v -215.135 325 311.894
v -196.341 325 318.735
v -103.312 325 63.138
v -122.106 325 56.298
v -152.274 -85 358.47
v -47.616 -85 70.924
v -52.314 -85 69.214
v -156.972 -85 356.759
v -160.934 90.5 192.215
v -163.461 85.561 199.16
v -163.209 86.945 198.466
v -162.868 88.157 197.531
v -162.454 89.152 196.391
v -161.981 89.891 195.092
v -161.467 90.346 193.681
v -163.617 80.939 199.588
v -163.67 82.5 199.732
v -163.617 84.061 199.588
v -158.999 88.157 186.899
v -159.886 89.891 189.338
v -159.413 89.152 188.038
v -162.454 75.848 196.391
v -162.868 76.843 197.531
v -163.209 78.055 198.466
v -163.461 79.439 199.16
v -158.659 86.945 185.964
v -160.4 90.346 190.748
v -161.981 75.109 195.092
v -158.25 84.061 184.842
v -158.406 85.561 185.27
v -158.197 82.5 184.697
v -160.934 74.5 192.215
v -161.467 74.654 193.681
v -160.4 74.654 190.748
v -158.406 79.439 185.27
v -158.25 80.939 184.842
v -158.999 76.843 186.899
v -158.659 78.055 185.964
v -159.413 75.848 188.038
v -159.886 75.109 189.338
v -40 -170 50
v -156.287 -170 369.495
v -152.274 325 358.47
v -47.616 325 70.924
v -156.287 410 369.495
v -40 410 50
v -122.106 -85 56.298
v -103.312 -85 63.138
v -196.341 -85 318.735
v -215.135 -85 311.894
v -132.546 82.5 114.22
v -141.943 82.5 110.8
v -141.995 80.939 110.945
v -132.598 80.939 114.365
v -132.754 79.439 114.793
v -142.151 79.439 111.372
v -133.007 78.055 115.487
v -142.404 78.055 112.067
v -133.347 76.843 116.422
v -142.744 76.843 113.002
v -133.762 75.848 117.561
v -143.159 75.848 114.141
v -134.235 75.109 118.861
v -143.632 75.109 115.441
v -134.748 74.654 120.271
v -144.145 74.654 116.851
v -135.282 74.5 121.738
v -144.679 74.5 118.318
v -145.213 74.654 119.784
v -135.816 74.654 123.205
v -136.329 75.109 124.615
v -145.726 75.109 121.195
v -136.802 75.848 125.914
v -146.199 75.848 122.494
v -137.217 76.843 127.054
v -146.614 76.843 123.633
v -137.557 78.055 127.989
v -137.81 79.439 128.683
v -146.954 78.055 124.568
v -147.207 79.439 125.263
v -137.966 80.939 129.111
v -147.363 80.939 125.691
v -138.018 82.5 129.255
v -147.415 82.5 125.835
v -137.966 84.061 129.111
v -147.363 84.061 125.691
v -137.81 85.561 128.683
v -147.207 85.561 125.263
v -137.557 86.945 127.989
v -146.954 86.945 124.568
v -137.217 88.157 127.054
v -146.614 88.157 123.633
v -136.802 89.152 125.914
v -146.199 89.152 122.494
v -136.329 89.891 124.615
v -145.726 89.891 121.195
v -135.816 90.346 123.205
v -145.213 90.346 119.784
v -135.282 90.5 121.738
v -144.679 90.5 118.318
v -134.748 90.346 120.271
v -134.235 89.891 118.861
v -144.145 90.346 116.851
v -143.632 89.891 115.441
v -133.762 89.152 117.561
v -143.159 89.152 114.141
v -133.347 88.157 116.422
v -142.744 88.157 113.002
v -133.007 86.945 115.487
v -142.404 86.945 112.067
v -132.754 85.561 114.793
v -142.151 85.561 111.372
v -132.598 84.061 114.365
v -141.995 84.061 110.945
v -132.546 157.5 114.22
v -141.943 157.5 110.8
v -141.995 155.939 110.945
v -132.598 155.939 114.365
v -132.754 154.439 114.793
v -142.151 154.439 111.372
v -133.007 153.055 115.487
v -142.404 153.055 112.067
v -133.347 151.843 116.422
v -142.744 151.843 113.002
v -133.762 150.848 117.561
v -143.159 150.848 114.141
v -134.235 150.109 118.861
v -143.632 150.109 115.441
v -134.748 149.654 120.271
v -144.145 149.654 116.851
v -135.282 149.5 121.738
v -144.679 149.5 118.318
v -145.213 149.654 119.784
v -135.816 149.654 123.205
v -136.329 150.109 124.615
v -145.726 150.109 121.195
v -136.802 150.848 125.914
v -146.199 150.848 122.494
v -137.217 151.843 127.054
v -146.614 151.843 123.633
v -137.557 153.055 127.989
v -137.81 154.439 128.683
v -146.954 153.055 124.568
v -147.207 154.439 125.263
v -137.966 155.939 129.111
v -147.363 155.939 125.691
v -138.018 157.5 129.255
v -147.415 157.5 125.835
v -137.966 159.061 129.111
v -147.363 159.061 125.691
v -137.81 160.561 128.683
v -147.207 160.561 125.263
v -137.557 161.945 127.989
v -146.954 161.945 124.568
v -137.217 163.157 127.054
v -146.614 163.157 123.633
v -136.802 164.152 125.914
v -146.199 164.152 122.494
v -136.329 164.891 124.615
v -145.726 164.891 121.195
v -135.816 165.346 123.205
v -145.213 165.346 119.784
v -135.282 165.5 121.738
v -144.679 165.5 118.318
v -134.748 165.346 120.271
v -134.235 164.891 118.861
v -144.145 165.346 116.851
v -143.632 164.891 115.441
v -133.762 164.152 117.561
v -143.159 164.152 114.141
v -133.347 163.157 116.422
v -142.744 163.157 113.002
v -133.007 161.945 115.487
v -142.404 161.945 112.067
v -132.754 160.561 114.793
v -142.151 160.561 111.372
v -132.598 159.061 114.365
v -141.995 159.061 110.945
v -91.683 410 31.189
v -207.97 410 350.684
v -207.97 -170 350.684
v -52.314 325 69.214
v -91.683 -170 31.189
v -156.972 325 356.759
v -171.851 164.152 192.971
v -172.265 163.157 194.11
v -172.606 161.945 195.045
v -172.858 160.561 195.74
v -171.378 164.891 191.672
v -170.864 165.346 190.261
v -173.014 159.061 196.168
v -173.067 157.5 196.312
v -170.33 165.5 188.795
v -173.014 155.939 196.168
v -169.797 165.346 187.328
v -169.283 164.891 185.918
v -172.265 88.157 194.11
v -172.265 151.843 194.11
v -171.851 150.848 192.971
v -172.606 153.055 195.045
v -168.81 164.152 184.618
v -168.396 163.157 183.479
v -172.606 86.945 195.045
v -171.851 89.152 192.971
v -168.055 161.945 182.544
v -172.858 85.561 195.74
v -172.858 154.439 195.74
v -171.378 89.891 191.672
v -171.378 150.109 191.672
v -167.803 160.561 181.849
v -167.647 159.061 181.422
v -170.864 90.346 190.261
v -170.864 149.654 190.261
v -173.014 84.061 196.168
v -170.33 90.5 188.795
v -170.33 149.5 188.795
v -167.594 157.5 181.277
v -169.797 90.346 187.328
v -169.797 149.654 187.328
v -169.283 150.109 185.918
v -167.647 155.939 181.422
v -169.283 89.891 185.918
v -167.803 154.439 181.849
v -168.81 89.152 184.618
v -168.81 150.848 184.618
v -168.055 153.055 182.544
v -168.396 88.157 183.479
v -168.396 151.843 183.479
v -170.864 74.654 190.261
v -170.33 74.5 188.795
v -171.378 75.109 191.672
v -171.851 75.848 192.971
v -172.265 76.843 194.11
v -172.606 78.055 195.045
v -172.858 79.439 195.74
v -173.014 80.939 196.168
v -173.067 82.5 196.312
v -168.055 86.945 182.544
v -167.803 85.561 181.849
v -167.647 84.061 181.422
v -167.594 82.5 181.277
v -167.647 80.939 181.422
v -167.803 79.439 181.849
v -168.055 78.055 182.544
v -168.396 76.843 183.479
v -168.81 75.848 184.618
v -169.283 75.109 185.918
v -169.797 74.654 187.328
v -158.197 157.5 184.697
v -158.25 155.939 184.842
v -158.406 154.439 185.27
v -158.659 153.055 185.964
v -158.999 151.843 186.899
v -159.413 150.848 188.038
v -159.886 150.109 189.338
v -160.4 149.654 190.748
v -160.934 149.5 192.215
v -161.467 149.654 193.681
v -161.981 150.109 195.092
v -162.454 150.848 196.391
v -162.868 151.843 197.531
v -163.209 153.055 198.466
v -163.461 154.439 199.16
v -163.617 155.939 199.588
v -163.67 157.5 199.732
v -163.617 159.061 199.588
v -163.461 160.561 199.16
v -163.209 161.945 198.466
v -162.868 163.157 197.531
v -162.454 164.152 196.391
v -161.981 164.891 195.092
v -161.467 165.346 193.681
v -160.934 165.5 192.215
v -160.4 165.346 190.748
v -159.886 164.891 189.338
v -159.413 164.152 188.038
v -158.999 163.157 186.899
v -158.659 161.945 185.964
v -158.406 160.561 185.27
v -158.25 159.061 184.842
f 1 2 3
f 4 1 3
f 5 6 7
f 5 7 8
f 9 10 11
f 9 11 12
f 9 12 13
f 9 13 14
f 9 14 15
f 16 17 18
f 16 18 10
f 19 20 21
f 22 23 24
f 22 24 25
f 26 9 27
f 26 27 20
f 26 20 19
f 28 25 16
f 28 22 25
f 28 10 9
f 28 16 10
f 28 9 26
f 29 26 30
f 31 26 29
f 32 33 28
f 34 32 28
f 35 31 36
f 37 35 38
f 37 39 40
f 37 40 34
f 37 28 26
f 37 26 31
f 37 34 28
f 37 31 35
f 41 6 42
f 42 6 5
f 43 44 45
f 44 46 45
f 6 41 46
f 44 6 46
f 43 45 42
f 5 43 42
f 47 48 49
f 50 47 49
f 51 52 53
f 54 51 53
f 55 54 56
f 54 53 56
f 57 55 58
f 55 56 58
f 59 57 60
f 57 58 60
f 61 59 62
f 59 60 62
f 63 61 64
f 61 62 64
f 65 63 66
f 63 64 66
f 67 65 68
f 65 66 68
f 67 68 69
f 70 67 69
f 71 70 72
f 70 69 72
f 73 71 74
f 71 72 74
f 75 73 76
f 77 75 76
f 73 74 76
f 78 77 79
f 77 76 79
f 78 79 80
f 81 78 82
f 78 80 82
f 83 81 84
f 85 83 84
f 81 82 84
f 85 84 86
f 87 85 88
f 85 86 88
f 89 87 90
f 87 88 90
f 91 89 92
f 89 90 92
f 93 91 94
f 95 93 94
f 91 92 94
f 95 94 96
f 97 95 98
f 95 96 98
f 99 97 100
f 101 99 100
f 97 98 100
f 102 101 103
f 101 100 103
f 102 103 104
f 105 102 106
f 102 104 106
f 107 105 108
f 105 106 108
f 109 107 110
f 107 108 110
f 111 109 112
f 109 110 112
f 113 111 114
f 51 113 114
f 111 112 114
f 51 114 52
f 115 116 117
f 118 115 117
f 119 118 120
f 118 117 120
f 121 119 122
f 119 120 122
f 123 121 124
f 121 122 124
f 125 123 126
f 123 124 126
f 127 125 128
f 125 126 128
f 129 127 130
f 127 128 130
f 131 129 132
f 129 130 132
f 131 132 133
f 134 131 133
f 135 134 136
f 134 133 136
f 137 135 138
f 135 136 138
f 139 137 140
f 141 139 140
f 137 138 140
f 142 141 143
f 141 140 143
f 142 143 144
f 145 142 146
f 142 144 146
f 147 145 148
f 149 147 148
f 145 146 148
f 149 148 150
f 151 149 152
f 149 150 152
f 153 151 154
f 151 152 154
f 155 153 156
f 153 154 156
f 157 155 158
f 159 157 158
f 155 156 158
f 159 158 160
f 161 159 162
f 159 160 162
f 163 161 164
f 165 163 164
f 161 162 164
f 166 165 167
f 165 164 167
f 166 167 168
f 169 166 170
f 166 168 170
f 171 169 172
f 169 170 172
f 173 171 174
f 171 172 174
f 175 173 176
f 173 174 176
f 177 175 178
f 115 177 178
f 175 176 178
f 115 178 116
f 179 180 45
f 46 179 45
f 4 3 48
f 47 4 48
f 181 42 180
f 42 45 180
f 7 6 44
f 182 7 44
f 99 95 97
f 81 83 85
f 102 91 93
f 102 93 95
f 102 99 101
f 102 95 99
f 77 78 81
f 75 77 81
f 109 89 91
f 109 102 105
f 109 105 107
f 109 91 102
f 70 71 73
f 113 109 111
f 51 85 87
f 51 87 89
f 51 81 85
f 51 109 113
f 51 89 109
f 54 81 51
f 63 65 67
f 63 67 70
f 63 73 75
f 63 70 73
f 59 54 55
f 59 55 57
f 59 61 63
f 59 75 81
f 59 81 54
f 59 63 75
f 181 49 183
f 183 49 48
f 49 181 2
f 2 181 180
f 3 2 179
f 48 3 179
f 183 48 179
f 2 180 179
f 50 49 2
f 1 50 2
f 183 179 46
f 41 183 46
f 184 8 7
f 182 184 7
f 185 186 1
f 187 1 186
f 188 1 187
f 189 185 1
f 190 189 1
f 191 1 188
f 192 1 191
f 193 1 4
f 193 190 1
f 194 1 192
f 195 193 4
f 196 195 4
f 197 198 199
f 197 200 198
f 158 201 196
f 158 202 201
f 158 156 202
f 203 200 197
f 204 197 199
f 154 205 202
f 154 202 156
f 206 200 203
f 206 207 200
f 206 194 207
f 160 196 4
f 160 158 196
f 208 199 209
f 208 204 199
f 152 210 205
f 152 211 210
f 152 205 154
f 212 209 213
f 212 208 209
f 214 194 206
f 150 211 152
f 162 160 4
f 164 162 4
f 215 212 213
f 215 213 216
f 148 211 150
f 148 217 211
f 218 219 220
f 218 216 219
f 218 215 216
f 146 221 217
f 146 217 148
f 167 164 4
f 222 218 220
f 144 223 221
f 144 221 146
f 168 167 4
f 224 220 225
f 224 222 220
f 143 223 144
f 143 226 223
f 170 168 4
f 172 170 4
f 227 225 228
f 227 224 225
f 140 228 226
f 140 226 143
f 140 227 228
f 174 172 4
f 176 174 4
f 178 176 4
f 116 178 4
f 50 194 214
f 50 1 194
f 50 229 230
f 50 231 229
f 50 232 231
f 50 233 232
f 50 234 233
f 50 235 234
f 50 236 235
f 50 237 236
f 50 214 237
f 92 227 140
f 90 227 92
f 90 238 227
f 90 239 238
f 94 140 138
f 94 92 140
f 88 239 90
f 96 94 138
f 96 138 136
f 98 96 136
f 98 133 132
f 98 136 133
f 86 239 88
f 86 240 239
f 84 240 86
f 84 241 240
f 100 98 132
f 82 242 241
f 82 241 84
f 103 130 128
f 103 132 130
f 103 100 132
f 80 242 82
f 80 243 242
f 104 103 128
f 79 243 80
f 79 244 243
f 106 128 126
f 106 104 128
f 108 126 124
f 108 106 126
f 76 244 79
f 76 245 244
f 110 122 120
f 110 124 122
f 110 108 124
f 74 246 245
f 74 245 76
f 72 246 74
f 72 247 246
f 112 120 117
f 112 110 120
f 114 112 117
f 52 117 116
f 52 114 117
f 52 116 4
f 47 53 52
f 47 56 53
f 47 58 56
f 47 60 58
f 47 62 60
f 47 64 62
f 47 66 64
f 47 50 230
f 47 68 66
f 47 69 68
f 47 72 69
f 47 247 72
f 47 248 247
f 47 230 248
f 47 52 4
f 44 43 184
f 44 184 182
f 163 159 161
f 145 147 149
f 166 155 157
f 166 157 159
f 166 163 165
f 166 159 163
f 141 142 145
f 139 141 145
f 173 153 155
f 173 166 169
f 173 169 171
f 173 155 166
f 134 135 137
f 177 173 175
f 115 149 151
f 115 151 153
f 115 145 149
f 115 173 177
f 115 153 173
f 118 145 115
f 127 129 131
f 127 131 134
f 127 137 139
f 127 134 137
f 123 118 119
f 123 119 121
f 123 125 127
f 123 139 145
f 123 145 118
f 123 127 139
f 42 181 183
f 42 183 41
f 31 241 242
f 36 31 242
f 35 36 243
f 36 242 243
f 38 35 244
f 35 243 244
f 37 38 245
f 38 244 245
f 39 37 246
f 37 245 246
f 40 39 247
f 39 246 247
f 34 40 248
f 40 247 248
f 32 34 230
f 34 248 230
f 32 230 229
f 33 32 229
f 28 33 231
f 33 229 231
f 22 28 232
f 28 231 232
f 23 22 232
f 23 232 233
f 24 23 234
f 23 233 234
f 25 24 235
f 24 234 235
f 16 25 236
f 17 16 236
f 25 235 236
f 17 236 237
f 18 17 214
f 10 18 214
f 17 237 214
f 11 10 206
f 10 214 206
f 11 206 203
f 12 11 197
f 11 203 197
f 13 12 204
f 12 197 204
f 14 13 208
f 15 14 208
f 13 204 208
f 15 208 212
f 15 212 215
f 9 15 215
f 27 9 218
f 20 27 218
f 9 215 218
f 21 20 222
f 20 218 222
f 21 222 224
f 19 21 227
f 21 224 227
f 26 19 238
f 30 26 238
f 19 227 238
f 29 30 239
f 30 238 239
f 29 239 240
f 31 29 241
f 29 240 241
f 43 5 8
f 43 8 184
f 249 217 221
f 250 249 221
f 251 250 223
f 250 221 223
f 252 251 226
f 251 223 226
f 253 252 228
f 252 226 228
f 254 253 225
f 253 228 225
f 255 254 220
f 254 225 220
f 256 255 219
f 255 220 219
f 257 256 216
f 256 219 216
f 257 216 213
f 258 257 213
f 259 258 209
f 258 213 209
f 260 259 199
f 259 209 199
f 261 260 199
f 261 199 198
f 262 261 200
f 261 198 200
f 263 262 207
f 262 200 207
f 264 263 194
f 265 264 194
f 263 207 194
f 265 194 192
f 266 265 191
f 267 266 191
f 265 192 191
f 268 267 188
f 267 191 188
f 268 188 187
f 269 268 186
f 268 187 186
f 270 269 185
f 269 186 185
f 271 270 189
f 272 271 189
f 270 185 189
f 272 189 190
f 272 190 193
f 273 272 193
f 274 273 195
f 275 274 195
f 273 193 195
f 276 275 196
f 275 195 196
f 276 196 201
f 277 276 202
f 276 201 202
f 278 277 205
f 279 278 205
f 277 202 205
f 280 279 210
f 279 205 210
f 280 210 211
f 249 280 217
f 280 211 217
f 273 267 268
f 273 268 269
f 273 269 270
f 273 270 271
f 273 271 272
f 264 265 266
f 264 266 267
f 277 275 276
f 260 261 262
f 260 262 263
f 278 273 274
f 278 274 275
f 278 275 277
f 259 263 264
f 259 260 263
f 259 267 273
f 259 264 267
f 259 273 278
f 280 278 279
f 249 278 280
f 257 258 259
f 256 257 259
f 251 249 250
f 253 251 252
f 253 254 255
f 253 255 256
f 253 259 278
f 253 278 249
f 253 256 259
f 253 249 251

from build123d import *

# Parameters (mm, degrees)
PAD002_DEPTH      = 410
PAD002_DEPTH_BACK = 170
POCKET_DEPTH      = 5
PAD_DEPTH         = 20
SKETCH004_R       = 8
POCKET001_DEPTH   = 10


with BuildPart() as part:
    # Sketch002 → Pad002 (new body, two sides)
    with BuildSketch(Plane(origin=(0, 0, 0), x_dir=(-1, 0, 0), z_dir=(0, 1, 0))) as pad002_sk:
        Polygon((40, 50), (156.2868487308, 369.4954910672), (207.969942874, 350.6843831843), (91.6830941432, 31.1888921171), align=None)
    extrude(amount=PAD002_DEPTH)
    extrude(pad002_sk.sketch, amount=-PAD002_DEPTH_BACK)

    # Sketch (on Face1 of Pad002) → Pocket (cut)
    with BuildSketch(Plane(origin=(-19.2511986202, 0, -7.0068632717), x_dir=(-0.3420201433, 0, 0.9396926208), z_dir=(0.9396926208, 0, 0.3420201433))):
        Polygon((82.9319106246, 85), (388.9319106246, 85), (388.9319106246, -325), (82.9319106246, -325), (82.9319106246, -120), align=None)
    extrude(amount=-POCKET_DEPTH, mode=Mode.SUBTRACT)

    # Sketch003 (on Face11 of Pocket) → Pad (join)
    with BuildSketch(Plane(origin=(-70.9342927634, 0, -25.8179711546), x_dir=(0.3420201433, 0, -0.9396926208), z_dir=(-0.9396926208, 0, -0.3420201433))):
        Polygon((-366.6654367723, -325), (-94.6654367723, -325), (-94.6654367723, -120), (-94.6654367723, 85), (-366.6654367723, 85), align=None)
    extrude(amount=PAD_DEPTH)

    # Sketch004 (on Face18 of Pad) → Pocket001 (cut)
    with BuildSketch(Plane(origin=(-89.7281451791, 0, -32.6583740211), x_dir=(0.3420201433, 0, -0.9396926208), z_dir=(-0.9396926208, 0, -0.3420201433))):
        with Locations((-235.6654367723, -82.5)):
            Circle(SKETCH004_R)
        with Locations((-160.6654367723, -82.5)):
            Circle(SKETCH004_R)
        with Locations((-160.6654367723, -157.5)):
            Circle(SKETCH004_R)
        with Locations((-235.6654367723, -157.5)):
            Circle(SKETCH004_R)
    extrude(amount=-POCKET001_DEPTH, mode=Mode.SUBTRACT)


solid = part.part
